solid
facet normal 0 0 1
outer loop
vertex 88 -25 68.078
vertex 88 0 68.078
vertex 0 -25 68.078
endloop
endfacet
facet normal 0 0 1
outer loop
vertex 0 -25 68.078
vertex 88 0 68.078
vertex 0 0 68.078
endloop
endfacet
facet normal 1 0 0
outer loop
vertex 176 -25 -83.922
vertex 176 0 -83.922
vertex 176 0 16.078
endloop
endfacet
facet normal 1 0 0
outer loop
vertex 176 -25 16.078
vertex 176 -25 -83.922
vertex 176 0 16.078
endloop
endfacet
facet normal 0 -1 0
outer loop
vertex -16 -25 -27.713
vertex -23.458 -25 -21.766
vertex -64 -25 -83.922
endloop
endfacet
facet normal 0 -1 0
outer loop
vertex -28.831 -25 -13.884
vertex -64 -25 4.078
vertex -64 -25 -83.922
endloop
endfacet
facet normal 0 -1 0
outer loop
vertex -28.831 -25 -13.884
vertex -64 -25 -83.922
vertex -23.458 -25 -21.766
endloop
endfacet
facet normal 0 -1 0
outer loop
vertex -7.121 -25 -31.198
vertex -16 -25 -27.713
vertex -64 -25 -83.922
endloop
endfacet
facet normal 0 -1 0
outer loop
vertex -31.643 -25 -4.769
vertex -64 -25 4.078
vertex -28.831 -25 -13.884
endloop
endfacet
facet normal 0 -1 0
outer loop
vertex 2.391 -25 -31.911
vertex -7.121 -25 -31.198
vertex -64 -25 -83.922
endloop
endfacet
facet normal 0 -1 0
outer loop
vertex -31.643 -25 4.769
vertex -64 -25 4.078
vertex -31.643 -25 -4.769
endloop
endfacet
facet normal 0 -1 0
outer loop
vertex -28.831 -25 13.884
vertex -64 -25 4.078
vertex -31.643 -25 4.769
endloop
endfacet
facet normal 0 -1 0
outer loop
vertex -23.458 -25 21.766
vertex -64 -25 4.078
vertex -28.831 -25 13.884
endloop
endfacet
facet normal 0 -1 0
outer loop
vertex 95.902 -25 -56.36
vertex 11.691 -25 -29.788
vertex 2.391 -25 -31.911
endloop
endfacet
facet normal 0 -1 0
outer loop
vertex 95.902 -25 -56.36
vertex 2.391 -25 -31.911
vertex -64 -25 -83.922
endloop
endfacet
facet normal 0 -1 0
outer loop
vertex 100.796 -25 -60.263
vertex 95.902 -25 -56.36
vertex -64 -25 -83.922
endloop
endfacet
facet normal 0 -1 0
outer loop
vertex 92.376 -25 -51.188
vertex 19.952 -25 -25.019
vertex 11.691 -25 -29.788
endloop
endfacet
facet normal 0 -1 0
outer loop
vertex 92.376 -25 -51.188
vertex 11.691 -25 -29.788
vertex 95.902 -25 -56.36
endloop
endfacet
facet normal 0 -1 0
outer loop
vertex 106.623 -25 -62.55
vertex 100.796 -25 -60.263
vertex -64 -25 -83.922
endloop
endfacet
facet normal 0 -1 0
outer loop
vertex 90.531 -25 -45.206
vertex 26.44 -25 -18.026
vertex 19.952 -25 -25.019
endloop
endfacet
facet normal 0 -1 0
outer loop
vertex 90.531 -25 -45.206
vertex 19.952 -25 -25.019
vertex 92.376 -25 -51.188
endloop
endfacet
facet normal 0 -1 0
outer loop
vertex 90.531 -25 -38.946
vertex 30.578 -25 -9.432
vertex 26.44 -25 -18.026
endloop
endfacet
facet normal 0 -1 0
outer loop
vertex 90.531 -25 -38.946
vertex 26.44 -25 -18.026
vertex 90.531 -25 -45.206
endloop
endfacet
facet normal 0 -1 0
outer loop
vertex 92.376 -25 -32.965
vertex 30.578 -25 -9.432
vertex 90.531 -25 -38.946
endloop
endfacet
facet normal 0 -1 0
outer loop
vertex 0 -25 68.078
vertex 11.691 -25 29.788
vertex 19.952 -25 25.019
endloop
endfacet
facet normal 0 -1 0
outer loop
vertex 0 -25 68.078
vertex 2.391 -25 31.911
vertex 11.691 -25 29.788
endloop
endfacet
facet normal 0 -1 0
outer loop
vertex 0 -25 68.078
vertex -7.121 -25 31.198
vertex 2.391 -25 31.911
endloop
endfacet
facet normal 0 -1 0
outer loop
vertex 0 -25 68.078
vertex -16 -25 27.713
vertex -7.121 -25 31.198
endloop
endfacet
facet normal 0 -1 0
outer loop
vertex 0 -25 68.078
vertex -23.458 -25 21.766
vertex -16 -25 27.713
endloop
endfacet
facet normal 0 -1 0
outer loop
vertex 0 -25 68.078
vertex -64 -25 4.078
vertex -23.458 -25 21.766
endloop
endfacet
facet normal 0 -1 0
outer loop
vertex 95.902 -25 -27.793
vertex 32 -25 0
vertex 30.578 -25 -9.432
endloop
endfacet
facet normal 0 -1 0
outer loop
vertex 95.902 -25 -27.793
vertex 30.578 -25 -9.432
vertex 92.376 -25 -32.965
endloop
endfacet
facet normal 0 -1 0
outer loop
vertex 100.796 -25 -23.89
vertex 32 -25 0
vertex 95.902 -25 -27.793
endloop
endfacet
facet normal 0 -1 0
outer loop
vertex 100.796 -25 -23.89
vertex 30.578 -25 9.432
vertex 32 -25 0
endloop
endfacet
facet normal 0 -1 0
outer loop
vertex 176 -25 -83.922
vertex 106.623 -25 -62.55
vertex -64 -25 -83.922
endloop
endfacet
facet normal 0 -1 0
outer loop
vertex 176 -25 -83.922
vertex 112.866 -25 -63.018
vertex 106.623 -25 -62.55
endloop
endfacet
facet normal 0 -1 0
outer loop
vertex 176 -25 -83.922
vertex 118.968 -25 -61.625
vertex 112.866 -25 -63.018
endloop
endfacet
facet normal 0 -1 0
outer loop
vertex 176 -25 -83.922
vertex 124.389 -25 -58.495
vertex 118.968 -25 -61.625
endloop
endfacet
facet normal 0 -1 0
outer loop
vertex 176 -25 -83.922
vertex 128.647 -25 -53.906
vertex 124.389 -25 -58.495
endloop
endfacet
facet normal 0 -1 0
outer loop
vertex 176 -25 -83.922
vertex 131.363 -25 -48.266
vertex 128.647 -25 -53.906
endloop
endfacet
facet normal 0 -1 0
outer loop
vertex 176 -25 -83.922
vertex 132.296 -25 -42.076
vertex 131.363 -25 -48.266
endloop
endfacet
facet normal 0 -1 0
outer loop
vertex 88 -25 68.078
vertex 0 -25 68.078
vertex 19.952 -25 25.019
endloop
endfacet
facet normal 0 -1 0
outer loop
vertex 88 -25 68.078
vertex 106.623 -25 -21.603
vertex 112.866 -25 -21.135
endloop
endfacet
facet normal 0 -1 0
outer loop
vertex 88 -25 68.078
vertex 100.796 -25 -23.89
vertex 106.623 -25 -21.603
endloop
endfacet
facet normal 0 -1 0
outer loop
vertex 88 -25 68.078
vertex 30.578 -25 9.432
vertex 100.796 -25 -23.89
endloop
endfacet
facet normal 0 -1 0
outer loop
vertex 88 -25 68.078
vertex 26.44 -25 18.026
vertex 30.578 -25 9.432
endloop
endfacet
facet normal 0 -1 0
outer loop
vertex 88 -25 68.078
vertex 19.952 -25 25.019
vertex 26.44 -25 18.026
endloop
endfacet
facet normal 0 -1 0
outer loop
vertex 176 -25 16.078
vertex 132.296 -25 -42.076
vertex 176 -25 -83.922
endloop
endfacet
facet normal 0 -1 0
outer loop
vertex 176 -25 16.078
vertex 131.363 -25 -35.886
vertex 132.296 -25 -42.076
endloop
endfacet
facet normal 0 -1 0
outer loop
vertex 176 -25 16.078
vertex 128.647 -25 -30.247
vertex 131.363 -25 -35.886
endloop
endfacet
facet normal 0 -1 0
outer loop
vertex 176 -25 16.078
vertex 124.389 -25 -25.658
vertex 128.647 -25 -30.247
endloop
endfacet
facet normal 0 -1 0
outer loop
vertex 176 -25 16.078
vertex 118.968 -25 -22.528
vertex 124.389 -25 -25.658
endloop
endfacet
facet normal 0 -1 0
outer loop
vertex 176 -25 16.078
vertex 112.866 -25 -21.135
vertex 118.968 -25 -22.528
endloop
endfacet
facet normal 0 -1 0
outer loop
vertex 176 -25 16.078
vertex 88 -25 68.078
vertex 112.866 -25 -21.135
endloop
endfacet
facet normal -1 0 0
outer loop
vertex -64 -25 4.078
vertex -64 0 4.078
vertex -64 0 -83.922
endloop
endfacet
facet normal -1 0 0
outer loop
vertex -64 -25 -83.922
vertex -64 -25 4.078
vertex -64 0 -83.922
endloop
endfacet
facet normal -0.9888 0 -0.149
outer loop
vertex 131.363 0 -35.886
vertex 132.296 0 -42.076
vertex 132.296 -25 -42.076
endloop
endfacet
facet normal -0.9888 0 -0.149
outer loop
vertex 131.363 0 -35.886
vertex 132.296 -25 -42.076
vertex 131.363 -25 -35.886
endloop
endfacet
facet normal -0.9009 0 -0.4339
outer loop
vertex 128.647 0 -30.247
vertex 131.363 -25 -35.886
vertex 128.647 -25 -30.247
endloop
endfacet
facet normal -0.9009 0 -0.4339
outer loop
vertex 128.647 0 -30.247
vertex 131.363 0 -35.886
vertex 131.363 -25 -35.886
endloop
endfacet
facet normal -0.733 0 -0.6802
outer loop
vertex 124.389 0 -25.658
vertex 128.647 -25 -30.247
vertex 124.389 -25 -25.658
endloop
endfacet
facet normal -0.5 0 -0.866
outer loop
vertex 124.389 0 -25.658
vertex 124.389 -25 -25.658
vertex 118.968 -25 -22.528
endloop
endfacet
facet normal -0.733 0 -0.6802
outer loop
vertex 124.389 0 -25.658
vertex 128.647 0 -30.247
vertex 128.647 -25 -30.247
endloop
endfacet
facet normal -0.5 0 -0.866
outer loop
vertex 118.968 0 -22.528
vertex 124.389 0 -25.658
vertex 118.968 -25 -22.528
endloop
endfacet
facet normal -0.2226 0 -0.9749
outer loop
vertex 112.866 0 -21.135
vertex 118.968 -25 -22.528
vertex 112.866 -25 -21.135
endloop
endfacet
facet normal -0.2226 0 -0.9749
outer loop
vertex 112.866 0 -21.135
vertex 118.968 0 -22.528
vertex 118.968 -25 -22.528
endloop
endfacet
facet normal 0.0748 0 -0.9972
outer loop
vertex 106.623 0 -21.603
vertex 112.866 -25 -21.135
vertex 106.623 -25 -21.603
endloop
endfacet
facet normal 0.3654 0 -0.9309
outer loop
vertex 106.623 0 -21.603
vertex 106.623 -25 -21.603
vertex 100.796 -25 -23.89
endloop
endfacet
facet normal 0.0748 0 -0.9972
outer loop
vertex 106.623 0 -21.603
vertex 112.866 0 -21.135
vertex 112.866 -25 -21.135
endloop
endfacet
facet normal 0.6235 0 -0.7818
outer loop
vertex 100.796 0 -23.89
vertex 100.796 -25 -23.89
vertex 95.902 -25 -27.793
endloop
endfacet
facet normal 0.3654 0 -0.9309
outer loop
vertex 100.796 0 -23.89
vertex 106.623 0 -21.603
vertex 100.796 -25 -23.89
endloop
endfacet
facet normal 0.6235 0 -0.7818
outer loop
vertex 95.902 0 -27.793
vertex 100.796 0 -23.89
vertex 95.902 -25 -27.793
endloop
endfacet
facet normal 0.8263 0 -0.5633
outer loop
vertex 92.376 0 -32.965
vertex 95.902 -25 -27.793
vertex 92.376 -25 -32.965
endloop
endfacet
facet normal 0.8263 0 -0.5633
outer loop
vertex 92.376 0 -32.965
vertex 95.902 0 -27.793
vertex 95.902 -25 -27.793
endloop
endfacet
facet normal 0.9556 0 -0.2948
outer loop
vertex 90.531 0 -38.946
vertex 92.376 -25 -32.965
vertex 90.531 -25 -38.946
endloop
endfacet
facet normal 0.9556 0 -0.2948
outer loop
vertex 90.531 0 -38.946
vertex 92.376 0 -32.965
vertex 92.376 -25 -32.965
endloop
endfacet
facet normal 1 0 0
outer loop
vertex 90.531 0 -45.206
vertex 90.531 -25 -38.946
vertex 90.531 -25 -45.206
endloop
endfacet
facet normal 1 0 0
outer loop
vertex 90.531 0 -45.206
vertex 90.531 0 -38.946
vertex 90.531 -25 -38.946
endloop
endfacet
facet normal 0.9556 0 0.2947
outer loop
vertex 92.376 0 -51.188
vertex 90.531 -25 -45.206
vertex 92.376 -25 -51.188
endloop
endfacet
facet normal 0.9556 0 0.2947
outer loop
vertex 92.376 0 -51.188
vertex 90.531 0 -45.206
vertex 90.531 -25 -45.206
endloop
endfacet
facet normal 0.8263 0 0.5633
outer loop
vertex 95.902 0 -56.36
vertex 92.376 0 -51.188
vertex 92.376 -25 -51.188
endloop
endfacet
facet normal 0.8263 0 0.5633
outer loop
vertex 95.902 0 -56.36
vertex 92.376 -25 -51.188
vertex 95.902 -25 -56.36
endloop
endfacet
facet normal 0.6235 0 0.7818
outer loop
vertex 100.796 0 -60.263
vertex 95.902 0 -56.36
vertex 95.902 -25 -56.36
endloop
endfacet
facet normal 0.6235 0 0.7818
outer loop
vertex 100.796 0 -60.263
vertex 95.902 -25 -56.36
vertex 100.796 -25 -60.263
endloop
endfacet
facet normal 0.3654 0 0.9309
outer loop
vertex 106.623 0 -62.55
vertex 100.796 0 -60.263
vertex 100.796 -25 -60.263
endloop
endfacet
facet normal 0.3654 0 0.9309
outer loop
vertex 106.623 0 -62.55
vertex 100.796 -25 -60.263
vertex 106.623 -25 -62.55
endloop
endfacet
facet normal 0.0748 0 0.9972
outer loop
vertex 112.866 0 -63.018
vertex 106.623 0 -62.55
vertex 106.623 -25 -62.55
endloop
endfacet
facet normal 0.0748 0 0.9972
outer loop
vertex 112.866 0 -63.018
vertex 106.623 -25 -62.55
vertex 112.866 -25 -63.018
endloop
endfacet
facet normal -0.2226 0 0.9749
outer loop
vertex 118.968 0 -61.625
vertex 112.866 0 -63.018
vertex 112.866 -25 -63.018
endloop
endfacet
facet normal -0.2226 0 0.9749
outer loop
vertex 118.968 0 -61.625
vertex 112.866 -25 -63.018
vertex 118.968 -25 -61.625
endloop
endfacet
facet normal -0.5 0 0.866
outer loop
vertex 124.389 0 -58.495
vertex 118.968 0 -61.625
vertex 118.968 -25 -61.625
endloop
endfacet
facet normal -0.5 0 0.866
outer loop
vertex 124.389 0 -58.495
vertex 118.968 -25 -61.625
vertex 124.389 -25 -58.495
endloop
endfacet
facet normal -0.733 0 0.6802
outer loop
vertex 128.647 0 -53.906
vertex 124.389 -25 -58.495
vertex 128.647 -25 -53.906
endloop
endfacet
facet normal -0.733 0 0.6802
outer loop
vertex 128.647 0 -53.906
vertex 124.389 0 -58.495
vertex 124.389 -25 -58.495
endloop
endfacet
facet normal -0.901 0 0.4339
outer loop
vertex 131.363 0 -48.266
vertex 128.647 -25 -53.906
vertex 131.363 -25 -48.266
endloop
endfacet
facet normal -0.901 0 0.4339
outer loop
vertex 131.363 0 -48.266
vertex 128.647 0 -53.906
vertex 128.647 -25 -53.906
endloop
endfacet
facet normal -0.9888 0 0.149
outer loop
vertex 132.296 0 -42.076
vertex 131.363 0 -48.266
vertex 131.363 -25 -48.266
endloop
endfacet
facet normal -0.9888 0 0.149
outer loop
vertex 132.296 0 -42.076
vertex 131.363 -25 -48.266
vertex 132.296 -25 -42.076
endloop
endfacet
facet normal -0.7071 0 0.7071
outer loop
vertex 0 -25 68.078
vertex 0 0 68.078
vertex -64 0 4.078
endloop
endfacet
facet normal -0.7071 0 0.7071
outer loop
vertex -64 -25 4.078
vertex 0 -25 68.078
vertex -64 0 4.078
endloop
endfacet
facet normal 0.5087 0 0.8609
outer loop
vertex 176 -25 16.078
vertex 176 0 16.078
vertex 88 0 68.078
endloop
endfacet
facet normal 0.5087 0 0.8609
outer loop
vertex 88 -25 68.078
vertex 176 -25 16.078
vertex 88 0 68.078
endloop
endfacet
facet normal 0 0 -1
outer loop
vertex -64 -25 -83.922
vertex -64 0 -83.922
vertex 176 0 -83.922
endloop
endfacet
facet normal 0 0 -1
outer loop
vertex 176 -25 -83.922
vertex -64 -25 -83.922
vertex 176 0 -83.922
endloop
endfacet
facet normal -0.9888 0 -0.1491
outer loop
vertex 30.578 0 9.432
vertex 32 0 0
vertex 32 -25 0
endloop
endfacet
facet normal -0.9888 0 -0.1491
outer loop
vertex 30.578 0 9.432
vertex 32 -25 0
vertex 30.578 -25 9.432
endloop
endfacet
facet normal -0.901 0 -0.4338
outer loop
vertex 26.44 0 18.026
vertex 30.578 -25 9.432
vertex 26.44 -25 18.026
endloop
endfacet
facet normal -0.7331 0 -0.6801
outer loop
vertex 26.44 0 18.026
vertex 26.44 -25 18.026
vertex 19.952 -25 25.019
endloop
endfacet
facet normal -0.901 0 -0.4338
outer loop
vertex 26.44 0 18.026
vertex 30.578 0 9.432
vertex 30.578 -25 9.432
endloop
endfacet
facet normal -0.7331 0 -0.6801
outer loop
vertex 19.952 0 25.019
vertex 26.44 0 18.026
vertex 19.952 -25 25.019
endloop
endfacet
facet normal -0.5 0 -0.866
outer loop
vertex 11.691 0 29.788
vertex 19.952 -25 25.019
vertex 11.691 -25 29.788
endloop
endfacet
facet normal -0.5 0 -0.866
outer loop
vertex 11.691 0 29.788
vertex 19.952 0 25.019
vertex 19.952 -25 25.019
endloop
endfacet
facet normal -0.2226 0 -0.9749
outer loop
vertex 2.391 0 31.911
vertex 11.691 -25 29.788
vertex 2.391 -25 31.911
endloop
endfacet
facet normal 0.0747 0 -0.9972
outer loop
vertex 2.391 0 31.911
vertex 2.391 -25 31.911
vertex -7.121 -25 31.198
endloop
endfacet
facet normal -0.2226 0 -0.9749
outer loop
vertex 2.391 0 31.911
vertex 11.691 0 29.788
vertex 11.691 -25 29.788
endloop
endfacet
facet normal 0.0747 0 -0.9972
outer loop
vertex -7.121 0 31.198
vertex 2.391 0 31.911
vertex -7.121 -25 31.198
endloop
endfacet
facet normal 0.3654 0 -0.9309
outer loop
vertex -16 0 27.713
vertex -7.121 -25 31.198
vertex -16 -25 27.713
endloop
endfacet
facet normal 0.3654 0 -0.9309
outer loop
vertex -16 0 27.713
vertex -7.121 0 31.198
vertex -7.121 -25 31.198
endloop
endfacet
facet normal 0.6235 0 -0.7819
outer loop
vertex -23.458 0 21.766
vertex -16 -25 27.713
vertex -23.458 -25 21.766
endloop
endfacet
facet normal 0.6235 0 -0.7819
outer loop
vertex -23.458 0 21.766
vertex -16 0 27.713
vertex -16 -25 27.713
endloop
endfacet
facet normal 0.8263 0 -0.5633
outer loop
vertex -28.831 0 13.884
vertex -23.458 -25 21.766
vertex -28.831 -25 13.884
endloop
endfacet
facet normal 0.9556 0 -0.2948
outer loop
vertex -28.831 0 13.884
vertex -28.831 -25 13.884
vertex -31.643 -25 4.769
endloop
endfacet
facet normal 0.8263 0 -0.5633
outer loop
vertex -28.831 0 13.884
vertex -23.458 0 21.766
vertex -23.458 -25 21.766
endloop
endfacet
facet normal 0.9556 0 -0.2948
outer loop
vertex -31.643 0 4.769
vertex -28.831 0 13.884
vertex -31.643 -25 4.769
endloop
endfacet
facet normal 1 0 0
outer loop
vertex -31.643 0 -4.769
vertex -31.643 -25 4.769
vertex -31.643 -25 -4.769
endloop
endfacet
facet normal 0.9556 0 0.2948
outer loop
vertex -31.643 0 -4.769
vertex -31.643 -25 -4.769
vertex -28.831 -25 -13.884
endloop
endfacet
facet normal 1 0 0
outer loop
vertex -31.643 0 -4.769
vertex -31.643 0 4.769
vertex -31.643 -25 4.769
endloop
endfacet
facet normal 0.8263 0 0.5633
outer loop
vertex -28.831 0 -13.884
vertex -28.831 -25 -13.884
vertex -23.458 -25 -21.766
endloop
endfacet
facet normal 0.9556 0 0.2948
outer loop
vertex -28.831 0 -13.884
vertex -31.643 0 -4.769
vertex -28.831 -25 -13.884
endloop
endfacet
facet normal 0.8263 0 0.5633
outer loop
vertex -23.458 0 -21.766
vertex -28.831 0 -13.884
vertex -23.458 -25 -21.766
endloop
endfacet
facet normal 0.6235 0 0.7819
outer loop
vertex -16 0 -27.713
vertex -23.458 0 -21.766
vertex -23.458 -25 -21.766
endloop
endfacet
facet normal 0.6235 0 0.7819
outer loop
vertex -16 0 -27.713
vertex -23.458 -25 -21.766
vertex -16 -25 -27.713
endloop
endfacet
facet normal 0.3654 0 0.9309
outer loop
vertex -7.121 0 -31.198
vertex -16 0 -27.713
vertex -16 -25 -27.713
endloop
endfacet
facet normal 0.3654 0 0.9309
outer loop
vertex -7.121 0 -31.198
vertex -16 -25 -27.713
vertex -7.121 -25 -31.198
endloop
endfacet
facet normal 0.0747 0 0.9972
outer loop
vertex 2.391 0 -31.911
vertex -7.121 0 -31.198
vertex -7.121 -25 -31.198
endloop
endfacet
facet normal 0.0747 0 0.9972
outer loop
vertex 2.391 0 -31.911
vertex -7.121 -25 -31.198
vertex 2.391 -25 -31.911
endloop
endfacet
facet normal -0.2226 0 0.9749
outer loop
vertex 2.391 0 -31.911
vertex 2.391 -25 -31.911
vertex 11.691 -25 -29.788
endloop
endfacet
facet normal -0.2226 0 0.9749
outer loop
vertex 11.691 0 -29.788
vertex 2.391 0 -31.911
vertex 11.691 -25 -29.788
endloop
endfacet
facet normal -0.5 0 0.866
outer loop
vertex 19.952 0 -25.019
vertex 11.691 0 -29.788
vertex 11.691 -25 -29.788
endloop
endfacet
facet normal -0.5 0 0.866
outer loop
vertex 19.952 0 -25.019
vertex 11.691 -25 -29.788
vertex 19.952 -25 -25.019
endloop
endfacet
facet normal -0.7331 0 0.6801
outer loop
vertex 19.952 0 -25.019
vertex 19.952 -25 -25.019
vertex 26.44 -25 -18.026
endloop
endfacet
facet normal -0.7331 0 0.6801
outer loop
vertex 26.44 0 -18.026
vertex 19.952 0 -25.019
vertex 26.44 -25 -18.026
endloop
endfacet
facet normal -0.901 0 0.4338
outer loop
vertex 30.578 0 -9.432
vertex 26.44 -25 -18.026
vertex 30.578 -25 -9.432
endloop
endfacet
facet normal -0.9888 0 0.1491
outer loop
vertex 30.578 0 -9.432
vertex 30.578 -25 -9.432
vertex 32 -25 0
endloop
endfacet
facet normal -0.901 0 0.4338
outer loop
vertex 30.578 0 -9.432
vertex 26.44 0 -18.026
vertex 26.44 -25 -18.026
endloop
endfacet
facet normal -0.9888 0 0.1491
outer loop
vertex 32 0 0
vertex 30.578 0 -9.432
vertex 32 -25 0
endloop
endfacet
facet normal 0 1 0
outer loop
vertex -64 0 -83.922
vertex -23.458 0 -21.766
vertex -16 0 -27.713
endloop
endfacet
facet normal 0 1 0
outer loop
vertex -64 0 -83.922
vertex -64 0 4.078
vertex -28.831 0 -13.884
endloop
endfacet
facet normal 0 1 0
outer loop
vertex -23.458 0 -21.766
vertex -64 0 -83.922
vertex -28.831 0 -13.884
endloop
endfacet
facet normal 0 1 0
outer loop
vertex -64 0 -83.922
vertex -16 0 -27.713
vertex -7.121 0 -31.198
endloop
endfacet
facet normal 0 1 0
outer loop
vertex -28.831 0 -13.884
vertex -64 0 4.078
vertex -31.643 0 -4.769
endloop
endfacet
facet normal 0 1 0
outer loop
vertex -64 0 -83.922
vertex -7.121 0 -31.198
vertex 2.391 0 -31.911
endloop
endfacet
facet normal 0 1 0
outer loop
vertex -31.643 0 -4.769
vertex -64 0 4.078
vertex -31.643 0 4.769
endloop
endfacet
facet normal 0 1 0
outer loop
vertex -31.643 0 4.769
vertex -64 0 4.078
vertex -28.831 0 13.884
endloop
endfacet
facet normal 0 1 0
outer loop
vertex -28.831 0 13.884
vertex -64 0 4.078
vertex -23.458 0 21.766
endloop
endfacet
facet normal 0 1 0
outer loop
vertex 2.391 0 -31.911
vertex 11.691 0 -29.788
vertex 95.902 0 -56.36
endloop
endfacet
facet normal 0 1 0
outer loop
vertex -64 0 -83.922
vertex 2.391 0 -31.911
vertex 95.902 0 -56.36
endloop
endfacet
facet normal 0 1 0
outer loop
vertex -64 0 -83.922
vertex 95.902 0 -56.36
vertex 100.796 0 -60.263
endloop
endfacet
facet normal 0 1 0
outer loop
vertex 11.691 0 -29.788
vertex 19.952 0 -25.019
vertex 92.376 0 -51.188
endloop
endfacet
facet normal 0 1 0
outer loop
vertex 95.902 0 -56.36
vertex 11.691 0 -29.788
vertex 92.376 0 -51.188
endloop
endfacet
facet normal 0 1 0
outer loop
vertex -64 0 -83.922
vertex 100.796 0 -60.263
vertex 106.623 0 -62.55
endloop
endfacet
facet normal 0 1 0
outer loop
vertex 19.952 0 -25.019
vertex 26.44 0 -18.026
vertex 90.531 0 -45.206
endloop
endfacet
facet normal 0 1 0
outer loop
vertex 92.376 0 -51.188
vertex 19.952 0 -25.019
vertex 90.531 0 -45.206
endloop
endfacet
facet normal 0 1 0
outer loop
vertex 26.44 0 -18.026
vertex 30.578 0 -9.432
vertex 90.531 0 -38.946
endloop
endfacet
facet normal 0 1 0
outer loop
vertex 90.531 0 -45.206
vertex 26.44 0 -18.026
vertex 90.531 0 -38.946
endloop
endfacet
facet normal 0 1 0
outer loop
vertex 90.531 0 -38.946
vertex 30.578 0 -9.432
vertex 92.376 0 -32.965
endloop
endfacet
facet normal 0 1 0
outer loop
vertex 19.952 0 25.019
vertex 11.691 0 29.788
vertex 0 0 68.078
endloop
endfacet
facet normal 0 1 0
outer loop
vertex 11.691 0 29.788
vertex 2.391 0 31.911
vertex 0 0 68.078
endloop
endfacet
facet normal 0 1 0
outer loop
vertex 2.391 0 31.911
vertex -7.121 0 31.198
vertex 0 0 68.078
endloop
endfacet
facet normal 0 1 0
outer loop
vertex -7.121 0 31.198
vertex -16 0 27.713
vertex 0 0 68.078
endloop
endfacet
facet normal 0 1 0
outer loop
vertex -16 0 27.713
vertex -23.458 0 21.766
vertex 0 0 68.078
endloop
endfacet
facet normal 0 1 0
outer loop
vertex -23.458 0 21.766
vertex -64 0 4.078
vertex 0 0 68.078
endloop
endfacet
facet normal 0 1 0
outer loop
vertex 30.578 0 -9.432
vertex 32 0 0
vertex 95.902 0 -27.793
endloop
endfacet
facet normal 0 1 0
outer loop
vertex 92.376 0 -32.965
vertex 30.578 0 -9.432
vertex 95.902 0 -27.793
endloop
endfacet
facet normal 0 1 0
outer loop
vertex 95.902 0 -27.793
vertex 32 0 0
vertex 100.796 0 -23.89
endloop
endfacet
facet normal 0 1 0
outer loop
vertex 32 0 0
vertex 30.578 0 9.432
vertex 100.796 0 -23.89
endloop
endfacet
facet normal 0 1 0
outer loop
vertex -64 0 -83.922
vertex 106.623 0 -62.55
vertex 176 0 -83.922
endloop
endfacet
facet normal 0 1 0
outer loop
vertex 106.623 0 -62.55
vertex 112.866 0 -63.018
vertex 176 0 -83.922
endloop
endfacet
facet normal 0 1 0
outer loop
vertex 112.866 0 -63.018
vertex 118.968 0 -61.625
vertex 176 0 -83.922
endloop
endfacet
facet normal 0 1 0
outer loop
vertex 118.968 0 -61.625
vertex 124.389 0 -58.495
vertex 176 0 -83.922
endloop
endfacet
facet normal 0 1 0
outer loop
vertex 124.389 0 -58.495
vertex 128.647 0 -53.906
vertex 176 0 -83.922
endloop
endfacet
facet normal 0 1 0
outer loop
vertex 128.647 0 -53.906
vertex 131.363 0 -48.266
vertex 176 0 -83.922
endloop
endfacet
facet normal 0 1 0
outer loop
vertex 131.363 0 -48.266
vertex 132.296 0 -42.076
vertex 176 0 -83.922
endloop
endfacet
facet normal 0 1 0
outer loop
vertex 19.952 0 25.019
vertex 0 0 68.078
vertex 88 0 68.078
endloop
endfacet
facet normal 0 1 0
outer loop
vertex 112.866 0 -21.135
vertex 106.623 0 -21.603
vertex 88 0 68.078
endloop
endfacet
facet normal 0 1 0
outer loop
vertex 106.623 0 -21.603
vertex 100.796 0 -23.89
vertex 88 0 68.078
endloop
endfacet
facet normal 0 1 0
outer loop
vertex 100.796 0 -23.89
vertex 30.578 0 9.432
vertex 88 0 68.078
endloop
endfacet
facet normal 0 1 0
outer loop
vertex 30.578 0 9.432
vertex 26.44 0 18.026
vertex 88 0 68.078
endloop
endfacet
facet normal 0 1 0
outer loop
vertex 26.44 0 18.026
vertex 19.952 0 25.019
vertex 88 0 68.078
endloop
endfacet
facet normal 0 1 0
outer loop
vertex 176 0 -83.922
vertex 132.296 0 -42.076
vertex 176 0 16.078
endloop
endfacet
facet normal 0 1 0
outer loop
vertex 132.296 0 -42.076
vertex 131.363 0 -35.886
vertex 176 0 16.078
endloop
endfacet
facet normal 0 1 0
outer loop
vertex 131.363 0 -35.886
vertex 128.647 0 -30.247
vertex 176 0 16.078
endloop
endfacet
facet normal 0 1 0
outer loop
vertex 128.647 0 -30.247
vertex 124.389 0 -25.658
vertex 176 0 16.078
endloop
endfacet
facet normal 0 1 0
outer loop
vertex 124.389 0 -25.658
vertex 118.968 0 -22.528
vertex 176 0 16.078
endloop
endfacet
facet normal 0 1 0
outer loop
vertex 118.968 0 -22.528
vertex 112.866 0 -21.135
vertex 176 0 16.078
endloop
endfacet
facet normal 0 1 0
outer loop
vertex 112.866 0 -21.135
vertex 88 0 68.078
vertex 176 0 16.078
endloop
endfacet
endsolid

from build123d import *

# Parameters (mm, degrees)
F0_R     = 21
F0_R_2   = 32
F1_DEPTH = 25


with BuildPart() as f1:
    # F0 (on Front) → F1 (new body)
    with BuildSketch(Plane.XZ):
        Polygon((-64, 4.07832), (-64, -83.92168), (176, -83.92168), (176, 16.07832), (88, 68.07832), (0, 68.07832), align=None)
        with Locations((111.296199, -42.076349)):
            Circle(F0_R, mode=Mode.SUBTRACT)
        Circle(F0_R_2, mode=Mode.SUBTRACT)
    extrude(amount=F1_DEPTH)


solid = f1.part
